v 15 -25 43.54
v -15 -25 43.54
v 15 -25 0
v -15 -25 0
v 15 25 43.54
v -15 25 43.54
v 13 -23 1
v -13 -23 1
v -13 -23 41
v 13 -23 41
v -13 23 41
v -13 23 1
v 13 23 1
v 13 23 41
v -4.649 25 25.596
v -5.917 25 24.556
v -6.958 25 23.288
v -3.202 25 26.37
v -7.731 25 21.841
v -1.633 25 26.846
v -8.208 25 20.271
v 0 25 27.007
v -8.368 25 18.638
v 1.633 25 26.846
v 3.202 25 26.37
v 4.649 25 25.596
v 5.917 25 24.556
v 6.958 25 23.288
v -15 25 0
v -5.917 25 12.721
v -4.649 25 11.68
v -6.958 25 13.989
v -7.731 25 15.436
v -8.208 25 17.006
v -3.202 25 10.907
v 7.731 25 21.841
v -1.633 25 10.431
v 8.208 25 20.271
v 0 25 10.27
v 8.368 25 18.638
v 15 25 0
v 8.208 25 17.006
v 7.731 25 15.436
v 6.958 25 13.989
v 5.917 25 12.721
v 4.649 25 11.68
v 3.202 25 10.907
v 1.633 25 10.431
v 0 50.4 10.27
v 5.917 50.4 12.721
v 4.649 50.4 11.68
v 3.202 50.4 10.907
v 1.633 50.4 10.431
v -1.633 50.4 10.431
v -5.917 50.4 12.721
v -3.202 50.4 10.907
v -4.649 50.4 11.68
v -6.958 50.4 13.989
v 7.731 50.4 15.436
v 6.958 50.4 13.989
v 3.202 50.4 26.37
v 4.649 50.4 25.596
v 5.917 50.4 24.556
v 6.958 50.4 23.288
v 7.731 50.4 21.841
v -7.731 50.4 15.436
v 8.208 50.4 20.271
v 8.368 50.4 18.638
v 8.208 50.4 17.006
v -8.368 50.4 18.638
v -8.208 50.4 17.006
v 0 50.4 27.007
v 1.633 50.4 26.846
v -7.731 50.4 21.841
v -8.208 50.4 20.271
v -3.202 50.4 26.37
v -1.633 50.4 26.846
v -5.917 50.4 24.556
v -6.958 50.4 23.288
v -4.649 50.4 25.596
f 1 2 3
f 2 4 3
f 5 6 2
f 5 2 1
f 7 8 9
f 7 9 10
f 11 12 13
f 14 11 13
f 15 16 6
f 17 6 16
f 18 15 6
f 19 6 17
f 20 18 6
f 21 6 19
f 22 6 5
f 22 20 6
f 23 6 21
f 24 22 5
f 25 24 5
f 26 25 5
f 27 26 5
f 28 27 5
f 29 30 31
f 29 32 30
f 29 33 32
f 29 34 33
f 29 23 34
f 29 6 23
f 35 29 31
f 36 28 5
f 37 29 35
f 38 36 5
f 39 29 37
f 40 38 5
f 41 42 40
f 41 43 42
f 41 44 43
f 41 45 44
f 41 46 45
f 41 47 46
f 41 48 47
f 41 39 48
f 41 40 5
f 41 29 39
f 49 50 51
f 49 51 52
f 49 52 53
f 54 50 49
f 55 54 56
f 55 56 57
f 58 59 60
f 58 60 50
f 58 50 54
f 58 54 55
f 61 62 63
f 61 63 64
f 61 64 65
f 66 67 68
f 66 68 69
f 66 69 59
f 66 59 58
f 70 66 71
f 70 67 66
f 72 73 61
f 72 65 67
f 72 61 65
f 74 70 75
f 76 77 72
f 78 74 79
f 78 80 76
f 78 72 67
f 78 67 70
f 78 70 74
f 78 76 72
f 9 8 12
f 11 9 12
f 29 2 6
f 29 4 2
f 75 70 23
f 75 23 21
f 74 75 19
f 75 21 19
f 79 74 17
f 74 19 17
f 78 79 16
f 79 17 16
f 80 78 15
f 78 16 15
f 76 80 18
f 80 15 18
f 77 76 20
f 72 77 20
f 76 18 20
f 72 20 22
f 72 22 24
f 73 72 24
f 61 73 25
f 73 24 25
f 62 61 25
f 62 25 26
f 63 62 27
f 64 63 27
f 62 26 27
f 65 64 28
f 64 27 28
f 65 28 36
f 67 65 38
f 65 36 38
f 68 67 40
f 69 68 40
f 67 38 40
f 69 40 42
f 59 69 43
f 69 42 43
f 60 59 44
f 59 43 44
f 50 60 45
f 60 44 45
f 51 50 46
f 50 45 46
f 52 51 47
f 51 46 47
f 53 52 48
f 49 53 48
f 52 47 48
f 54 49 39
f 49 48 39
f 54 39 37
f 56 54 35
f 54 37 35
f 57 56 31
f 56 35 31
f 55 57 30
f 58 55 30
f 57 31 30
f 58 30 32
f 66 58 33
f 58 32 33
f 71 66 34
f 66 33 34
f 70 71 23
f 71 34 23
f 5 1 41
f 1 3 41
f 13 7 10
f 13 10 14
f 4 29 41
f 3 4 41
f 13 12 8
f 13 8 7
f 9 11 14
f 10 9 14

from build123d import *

# Parameters (mm, degrees)
F0_W     = 30
F0_H     = 50
F1_DEPTH = 1
F2_W     = 2
F2_H     = 2
F2_W_2   = 26
F2_H_2   = 46
F3_DEPTH = 40
F5_W     = 30
F5_H     = 50
F6_DEPTH = 2.54
F4_R     = 8.368495
F8_DEPTH = 25.4


with BuildPart() as f1:
    # F0 (on Top) → F1 (new body)
    with BuildSketch(Plane.XY):
        Rectangle(F0_W, F0_H)
    extrude(amount=F1_DEPTH)

    # F2 (on face) → F3 (join)
    with BuildSketch(Plane.XY.offset(1)):
        with Locations((-14, 24)):
            Rectangle(F2_W, F2_H)
        with Locations((0, 24)):
            Rectangle(F2_W_2, F2_H)
        with Locations((-14, 0)):
            Rectangle(F2_W, F2_H_2)
        with Locations((14, 24)):
            Rectangle(F2_W, F2_H)
        with Locations((-14, -24)):
            Rectangle(F2_W, F2_H)
        with Locations((0, -24)):
            Rectangle(F2_W_2, F2_H)
        with Locations((14, 0)):
            Rectangle(F2_W, F2_H_2)
        with Locations((14, -24)):
            Rectangle(F2_W, F2_H)
    extrude(amount=F3_DEPTH)

    # F5 (on face) → F6 (join)
    with BuildSketch(Plane.XY.offset(41)):
        Rectangle(F5_W, F5_H)
    extrude(amount=F6_DEPTH)

    # F4 (on face) → F8 (join)
    with BuildSketch(Plane(origin=(0, 25, 0), x_dir=(-1, 0, 0), z_dir=(0, 1, 0))):
        with Locations((0, 18.638214)):
            Circle(F4_R)
    extrude(amount=F8_DEPTH)


solid = f1.part
